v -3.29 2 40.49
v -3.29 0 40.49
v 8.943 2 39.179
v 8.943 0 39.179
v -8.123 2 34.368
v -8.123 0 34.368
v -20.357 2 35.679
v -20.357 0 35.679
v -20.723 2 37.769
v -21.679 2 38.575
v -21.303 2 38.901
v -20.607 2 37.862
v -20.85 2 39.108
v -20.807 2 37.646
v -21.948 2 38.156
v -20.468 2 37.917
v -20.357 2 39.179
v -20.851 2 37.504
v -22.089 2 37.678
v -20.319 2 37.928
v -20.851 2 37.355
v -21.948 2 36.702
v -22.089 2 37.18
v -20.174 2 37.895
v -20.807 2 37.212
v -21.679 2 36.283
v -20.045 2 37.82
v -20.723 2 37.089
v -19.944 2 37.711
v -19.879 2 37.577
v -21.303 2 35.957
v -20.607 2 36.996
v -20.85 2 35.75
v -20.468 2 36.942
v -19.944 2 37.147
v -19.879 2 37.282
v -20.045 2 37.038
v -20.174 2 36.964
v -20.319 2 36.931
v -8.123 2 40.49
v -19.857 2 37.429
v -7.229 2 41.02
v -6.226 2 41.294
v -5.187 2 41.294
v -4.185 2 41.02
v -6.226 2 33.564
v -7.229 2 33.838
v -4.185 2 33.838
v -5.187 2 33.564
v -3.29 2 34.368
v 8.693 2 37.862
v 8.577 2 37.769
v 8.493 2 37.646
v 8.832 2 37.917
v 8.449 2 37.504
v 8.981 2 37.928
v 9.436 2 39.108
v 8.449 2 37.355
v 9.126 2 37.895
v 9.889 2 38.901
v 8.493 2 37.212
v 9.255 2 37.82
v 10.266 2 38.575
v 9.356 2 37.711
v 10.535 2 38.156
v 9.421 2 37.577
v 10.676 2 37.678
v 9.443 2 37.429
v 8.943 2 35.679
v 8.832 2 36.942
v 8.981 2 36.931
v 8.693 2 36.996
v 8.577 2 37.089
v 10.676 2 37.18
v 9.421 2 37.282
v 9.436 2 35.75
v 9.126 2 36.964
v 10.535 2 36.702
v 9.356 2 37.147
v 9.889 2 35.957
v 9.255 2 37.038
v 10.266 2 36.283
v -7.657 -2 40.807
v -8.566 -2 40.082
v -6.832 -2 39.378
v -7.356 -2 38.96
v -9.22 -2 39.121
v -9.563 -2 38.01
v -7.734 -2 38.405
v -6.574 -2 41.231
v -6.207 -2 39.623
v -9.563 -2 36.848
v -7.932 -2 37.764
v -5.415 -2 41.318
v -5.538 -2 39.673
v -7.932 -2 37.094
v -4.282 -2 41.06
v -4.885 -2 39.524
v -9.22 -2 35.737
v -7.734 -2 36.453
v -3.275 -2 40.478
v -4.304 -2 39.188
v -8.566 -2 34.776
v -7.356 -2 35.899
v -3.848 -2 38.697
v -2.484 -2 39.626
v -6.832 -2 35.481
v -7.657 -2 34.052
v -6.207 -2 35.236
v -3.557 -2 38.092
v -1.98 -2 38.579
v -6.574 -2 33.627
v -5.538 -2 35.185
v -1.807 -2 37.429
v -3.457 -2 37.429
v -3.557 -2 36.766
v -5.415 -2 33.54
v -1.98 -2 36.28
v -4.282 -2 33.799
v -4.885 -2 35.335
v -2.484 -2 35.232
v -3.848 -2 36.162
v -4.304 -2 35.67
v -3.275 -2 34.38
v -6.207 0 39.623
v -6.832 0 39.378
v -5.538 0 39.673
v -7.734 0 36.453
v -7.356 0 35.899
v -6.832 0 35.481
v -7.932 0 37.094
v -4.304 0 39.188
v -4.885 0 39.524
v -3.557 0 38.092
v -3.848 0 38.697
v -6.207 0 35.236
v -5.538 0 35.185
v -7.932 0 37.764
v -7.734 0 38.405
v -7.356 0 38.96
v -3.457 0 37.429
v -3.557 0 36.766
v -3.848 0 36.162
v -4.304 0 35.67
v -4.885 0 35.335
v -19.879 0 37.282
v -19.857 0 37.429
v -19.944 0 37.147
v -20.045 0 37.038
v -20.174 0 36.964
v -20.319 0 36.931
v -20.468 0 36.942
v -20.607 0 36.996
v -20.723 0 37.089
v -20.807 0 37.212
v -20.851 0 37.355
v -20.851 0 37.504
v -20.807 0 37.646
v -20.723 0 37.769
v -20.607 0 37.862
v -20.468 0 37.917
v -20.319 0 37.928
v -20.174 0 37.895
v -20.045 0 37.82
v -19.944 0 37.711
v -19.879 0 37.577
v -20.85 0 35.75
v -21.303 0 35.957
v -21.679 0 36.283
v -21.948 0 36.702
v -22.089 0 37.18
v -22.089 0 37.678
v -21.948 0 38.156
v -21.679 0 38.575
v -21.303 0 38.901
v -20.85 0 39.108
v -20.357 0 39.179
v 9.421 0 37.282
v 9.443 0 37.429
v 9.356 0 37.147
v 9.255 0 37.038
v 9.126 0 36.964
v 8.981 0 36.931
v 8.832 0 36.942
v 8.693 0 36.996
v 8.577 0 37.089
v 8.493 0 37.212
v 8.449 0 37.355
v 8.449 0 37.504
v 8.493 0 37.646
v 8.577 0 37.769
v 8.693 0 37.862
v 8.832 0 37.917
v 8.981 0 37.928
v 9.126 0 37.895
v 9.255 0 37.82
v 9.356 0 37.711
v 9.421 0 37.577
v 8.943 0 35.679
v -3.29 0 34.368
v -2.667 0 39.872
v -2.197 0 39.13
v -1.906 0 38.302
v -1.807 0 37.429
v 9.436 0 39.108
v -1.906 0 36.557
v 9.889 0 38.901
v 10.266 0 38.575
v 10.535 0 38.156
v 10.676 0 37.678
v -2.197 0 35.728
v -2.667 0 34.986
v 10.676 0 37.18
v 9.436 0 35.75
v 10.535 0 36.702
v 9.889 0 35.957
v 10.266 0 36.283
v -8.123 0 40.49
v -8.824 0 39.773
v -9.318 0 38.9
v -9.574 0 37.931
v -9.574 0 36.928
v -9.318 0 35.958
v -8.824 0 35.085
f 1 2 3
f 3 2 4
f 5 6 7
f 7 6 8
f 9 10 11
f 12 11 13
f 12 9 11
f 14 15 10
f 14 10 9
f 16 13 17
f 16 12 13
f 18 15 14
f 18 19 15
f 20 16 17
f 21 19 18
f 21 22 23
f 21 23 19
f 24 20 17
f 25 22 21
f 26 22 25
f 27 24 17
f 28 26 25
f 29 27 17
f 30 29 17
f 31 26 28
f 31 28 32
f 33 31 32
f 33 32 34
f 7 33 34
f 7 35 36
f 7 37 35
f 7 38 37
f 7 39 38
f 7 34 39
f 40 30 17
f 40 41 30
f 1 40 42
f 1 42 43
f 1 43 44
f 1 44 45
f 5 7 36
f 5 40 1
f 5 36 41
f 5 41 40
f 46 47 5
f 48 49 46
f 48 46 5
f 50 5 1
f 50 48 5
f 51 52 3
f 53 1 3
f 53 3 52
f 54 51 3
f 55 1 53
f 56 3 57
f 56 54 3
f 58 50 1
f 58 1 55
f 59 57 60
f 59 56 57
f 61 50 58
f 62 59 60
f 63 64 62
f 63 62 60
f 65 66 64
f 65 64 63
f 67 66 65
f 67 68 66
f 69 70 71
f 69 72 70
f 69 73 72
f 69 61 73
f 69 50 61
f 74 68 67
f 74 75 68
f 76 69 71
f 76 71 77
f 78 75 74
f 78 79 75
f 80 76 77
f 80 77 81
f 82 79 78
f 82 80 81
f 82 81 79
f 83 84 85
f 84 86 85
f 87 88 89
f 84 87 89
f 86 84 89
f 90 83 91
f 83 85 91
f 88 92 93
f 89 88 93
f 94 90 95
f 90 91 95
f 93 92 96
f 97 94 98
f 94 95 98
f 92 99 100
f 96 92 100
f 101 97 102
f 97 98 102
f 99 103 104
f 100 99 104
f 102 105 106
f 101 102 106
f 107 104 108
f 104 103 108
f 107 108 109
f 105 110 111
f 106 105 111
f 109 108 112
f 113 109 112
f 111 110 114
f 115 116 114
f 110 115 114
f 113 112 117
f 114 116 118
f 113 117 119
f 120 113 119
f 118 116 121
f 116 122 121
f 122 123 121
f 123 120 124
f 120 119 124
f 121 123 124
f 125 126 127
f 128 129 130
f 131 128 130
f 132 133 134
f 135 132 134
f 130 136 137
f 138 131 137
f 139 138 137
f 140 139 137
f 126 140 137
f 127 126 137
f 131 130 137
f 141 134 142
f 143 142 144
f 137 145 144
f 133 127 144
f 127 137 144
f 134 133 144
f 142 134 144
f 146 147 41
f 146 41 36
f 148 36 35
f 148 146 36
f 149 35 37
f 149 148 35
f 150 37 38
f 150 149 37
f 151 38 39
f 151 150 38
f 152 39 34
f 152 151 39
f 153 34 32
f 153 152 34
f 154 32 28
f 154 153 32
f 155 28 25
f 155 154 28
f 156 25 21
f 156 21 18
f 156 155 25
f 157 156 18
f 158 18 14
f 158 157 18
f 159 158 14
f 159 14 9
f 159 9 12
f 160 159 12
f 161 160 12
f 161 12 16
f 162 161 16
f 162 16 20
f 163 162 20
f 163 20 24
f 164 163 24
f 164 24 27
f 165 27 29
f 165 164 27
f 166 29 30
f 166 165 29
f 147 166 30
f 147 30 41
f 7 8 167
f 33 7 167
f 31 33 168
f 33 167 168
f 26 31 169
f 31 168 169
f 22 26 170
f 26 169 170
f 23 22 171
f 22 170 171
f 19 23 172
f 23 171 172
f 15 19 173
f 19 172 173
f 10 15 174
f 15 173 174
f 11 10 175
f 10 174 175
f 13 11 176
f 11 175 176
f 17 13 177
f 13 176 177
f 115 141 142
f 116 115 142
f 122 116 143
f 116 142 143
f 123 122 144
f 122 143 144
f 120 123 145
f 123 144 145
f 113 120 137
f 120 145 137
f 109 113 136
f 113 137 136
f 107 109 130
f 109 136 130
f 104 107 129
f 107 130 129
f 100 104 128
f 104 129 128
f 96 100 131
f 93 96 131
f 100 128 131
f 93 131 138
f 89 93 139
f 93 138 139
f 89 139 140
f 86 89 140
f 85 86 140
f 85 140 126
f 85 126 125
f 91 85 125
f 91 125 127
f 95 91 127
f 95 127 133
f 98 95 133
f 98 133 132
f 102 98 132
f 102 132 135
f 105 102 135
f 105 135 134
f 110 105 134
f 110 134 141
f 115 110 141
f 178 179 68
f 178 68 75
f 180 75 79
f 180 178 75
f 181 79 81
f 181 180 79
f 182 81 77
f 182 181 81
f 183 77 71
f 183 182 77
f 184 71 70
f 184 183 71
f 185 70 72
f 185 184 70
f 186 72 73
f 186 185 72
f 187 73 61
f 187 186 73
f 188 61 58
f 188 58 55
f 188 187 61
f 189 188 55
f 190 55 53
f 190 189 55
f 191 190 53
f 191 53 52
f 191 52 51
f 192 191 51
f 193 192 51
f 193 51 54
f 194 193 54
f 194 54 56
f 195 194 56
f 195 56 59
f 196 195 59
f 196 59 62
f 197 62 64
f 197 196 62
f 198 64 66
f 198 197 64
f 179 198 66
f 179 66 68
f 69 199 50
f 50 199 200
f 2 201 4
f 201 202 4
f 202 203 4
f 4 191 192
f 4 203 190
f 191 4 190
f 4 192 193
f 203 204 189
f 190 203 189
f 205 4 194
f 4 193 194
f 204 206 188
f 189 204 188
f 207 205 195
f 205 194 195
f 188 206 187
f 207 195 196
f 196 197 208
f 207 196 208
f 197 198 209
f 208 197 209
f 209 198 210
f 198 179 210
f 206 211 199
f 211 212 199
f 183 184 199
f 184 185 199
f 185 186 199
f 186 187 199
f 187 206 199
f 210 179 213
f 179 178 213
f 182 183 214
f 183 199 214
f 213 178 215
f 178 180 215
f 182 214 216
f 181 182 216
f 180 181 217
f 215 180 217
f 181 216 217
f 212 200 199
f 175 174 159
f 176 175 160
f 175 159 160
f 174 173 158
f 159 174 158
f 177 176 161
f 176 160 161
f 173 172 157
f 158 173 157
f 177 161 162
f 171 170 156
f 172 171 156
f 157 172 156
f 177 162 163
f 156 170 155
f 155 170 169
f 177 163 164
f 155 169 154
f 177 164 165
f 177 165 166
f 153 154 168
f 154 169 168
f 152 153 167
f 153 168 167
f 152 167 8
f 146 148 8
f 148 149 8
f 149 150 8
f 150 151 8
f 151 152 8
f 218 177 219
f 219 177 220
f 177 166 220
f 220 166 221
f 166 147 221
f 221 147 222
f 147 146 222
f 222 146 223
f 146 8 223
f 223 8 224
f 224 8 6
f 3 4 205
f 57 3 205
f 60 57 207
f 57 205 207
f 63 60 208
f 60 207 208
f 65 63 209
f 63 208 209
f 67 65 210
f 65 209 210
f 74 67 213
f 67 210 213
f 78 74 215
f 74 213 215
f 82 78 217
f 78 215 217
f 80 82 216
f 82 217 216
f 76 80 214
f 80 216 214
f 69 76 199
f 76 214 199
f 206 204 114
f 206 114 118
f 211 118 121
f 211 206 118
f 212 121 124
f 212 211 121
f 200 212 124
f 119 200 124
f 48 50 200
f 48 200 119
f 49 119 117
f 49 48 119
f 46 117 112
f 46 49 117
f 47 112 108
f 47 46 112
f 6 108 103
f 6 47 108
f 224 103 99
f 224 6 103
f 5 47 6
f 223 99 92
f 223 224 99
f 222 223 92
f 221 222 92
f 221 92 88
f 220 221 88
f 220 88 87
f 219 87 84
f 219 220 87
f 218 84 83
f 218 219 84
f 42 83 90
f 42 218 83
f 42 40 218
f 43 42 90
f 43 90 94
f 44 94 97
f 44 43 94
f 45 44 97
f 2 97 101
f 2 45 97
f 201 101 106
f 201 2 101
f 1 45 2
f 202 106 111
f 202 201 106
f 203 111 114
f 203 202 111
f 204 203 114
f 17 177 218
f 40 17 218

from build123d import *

# Parameters (mm, degrees)
SKETCH3_R                = 3.9
BOSS_EXTRUDE1_DEPTH      = 2
BOSS_EXTRUDE1_DEPTH_BACK = 2
SKETCH5_R                = 0.5
BOSS_EXTRUDE4_DEPTH      = 2
SKETCH4_R                = 2.25
CUT_EXTRUDE1_DEPTH       = 3


with BuildPart() as part:
    # Sketch3 → Boss-Extrude1 (new body, two sides)
    with BuildSketch(Plane(origin=(0, 0, 0), x_dir=(1, 0, 0), z_dir=(0, 1, 0))) as boss_extrude1_sk:
        with Locations((-5.706641347, -37.429153992)):
            Circle(SKETCH3_R)
    extrude(amount=BOSS_EXTRUDE1_DEPTH)
    extrude(boss_extrude1_sk.sketch, amount=-BOSS_EXTRUDE1_DEPTH_BACK)

    # Sketch5 → Boss-Extrude4 (add)
    with BuildSketch(Plane(origin=(0, 0, 0), x_dir=(1, 0, 0), z_dir=(0, 1, 0))):
        with BuildLine():
            Line((8.943358653, -35.679153992), (-5.706641347, -34.108983126))
            Line((-5.706641347, -34.108983126), (-20.356641347, -35.679153992))
            ThreePointArc((-20.356641347, -35.679153992), (-22.106641347, -37.429153992), (-20.356641347, -39.179153992))
            Line((-20.356641347, -39.179153992), (-5.706641347, -40.749324858))
            Line((-5.706641347, -40.749324858), (8.943358653, -39.179153992))
            ThreePointArc((8.943358653, -39.179153992), (10.693358653, -37.429153992), (8.943358653, -35.679153992))
        make_face()
        with Locations((8.943358653, -37.429153992)):
            Circle(SKETCH5_R, mode=Mode.SUBTRACT)
        with Locations((-20.356641347, -37.429153992)):
            Circle(SKETCH5_R, mode=Mode.SUBTRACT)
    extrude(amount=BOSS_EXTRUDE4_DEPTH)

    # Sketch4 → Cut-Extrude1 (cut, through all)
    with BuildSketch(Plane(origin=(0, 0, 0), x_dir=(1, 0, 0), z_dir=(0, 1, 0))):
        with Locations((-5.706641347, -37.429153992)):
            Circle(SKETCH4_R)
    extrude(amount=-CUT_EXTRUDE1_DEPTH, mode=Mode.SUBTRACT)


solid = part.part
